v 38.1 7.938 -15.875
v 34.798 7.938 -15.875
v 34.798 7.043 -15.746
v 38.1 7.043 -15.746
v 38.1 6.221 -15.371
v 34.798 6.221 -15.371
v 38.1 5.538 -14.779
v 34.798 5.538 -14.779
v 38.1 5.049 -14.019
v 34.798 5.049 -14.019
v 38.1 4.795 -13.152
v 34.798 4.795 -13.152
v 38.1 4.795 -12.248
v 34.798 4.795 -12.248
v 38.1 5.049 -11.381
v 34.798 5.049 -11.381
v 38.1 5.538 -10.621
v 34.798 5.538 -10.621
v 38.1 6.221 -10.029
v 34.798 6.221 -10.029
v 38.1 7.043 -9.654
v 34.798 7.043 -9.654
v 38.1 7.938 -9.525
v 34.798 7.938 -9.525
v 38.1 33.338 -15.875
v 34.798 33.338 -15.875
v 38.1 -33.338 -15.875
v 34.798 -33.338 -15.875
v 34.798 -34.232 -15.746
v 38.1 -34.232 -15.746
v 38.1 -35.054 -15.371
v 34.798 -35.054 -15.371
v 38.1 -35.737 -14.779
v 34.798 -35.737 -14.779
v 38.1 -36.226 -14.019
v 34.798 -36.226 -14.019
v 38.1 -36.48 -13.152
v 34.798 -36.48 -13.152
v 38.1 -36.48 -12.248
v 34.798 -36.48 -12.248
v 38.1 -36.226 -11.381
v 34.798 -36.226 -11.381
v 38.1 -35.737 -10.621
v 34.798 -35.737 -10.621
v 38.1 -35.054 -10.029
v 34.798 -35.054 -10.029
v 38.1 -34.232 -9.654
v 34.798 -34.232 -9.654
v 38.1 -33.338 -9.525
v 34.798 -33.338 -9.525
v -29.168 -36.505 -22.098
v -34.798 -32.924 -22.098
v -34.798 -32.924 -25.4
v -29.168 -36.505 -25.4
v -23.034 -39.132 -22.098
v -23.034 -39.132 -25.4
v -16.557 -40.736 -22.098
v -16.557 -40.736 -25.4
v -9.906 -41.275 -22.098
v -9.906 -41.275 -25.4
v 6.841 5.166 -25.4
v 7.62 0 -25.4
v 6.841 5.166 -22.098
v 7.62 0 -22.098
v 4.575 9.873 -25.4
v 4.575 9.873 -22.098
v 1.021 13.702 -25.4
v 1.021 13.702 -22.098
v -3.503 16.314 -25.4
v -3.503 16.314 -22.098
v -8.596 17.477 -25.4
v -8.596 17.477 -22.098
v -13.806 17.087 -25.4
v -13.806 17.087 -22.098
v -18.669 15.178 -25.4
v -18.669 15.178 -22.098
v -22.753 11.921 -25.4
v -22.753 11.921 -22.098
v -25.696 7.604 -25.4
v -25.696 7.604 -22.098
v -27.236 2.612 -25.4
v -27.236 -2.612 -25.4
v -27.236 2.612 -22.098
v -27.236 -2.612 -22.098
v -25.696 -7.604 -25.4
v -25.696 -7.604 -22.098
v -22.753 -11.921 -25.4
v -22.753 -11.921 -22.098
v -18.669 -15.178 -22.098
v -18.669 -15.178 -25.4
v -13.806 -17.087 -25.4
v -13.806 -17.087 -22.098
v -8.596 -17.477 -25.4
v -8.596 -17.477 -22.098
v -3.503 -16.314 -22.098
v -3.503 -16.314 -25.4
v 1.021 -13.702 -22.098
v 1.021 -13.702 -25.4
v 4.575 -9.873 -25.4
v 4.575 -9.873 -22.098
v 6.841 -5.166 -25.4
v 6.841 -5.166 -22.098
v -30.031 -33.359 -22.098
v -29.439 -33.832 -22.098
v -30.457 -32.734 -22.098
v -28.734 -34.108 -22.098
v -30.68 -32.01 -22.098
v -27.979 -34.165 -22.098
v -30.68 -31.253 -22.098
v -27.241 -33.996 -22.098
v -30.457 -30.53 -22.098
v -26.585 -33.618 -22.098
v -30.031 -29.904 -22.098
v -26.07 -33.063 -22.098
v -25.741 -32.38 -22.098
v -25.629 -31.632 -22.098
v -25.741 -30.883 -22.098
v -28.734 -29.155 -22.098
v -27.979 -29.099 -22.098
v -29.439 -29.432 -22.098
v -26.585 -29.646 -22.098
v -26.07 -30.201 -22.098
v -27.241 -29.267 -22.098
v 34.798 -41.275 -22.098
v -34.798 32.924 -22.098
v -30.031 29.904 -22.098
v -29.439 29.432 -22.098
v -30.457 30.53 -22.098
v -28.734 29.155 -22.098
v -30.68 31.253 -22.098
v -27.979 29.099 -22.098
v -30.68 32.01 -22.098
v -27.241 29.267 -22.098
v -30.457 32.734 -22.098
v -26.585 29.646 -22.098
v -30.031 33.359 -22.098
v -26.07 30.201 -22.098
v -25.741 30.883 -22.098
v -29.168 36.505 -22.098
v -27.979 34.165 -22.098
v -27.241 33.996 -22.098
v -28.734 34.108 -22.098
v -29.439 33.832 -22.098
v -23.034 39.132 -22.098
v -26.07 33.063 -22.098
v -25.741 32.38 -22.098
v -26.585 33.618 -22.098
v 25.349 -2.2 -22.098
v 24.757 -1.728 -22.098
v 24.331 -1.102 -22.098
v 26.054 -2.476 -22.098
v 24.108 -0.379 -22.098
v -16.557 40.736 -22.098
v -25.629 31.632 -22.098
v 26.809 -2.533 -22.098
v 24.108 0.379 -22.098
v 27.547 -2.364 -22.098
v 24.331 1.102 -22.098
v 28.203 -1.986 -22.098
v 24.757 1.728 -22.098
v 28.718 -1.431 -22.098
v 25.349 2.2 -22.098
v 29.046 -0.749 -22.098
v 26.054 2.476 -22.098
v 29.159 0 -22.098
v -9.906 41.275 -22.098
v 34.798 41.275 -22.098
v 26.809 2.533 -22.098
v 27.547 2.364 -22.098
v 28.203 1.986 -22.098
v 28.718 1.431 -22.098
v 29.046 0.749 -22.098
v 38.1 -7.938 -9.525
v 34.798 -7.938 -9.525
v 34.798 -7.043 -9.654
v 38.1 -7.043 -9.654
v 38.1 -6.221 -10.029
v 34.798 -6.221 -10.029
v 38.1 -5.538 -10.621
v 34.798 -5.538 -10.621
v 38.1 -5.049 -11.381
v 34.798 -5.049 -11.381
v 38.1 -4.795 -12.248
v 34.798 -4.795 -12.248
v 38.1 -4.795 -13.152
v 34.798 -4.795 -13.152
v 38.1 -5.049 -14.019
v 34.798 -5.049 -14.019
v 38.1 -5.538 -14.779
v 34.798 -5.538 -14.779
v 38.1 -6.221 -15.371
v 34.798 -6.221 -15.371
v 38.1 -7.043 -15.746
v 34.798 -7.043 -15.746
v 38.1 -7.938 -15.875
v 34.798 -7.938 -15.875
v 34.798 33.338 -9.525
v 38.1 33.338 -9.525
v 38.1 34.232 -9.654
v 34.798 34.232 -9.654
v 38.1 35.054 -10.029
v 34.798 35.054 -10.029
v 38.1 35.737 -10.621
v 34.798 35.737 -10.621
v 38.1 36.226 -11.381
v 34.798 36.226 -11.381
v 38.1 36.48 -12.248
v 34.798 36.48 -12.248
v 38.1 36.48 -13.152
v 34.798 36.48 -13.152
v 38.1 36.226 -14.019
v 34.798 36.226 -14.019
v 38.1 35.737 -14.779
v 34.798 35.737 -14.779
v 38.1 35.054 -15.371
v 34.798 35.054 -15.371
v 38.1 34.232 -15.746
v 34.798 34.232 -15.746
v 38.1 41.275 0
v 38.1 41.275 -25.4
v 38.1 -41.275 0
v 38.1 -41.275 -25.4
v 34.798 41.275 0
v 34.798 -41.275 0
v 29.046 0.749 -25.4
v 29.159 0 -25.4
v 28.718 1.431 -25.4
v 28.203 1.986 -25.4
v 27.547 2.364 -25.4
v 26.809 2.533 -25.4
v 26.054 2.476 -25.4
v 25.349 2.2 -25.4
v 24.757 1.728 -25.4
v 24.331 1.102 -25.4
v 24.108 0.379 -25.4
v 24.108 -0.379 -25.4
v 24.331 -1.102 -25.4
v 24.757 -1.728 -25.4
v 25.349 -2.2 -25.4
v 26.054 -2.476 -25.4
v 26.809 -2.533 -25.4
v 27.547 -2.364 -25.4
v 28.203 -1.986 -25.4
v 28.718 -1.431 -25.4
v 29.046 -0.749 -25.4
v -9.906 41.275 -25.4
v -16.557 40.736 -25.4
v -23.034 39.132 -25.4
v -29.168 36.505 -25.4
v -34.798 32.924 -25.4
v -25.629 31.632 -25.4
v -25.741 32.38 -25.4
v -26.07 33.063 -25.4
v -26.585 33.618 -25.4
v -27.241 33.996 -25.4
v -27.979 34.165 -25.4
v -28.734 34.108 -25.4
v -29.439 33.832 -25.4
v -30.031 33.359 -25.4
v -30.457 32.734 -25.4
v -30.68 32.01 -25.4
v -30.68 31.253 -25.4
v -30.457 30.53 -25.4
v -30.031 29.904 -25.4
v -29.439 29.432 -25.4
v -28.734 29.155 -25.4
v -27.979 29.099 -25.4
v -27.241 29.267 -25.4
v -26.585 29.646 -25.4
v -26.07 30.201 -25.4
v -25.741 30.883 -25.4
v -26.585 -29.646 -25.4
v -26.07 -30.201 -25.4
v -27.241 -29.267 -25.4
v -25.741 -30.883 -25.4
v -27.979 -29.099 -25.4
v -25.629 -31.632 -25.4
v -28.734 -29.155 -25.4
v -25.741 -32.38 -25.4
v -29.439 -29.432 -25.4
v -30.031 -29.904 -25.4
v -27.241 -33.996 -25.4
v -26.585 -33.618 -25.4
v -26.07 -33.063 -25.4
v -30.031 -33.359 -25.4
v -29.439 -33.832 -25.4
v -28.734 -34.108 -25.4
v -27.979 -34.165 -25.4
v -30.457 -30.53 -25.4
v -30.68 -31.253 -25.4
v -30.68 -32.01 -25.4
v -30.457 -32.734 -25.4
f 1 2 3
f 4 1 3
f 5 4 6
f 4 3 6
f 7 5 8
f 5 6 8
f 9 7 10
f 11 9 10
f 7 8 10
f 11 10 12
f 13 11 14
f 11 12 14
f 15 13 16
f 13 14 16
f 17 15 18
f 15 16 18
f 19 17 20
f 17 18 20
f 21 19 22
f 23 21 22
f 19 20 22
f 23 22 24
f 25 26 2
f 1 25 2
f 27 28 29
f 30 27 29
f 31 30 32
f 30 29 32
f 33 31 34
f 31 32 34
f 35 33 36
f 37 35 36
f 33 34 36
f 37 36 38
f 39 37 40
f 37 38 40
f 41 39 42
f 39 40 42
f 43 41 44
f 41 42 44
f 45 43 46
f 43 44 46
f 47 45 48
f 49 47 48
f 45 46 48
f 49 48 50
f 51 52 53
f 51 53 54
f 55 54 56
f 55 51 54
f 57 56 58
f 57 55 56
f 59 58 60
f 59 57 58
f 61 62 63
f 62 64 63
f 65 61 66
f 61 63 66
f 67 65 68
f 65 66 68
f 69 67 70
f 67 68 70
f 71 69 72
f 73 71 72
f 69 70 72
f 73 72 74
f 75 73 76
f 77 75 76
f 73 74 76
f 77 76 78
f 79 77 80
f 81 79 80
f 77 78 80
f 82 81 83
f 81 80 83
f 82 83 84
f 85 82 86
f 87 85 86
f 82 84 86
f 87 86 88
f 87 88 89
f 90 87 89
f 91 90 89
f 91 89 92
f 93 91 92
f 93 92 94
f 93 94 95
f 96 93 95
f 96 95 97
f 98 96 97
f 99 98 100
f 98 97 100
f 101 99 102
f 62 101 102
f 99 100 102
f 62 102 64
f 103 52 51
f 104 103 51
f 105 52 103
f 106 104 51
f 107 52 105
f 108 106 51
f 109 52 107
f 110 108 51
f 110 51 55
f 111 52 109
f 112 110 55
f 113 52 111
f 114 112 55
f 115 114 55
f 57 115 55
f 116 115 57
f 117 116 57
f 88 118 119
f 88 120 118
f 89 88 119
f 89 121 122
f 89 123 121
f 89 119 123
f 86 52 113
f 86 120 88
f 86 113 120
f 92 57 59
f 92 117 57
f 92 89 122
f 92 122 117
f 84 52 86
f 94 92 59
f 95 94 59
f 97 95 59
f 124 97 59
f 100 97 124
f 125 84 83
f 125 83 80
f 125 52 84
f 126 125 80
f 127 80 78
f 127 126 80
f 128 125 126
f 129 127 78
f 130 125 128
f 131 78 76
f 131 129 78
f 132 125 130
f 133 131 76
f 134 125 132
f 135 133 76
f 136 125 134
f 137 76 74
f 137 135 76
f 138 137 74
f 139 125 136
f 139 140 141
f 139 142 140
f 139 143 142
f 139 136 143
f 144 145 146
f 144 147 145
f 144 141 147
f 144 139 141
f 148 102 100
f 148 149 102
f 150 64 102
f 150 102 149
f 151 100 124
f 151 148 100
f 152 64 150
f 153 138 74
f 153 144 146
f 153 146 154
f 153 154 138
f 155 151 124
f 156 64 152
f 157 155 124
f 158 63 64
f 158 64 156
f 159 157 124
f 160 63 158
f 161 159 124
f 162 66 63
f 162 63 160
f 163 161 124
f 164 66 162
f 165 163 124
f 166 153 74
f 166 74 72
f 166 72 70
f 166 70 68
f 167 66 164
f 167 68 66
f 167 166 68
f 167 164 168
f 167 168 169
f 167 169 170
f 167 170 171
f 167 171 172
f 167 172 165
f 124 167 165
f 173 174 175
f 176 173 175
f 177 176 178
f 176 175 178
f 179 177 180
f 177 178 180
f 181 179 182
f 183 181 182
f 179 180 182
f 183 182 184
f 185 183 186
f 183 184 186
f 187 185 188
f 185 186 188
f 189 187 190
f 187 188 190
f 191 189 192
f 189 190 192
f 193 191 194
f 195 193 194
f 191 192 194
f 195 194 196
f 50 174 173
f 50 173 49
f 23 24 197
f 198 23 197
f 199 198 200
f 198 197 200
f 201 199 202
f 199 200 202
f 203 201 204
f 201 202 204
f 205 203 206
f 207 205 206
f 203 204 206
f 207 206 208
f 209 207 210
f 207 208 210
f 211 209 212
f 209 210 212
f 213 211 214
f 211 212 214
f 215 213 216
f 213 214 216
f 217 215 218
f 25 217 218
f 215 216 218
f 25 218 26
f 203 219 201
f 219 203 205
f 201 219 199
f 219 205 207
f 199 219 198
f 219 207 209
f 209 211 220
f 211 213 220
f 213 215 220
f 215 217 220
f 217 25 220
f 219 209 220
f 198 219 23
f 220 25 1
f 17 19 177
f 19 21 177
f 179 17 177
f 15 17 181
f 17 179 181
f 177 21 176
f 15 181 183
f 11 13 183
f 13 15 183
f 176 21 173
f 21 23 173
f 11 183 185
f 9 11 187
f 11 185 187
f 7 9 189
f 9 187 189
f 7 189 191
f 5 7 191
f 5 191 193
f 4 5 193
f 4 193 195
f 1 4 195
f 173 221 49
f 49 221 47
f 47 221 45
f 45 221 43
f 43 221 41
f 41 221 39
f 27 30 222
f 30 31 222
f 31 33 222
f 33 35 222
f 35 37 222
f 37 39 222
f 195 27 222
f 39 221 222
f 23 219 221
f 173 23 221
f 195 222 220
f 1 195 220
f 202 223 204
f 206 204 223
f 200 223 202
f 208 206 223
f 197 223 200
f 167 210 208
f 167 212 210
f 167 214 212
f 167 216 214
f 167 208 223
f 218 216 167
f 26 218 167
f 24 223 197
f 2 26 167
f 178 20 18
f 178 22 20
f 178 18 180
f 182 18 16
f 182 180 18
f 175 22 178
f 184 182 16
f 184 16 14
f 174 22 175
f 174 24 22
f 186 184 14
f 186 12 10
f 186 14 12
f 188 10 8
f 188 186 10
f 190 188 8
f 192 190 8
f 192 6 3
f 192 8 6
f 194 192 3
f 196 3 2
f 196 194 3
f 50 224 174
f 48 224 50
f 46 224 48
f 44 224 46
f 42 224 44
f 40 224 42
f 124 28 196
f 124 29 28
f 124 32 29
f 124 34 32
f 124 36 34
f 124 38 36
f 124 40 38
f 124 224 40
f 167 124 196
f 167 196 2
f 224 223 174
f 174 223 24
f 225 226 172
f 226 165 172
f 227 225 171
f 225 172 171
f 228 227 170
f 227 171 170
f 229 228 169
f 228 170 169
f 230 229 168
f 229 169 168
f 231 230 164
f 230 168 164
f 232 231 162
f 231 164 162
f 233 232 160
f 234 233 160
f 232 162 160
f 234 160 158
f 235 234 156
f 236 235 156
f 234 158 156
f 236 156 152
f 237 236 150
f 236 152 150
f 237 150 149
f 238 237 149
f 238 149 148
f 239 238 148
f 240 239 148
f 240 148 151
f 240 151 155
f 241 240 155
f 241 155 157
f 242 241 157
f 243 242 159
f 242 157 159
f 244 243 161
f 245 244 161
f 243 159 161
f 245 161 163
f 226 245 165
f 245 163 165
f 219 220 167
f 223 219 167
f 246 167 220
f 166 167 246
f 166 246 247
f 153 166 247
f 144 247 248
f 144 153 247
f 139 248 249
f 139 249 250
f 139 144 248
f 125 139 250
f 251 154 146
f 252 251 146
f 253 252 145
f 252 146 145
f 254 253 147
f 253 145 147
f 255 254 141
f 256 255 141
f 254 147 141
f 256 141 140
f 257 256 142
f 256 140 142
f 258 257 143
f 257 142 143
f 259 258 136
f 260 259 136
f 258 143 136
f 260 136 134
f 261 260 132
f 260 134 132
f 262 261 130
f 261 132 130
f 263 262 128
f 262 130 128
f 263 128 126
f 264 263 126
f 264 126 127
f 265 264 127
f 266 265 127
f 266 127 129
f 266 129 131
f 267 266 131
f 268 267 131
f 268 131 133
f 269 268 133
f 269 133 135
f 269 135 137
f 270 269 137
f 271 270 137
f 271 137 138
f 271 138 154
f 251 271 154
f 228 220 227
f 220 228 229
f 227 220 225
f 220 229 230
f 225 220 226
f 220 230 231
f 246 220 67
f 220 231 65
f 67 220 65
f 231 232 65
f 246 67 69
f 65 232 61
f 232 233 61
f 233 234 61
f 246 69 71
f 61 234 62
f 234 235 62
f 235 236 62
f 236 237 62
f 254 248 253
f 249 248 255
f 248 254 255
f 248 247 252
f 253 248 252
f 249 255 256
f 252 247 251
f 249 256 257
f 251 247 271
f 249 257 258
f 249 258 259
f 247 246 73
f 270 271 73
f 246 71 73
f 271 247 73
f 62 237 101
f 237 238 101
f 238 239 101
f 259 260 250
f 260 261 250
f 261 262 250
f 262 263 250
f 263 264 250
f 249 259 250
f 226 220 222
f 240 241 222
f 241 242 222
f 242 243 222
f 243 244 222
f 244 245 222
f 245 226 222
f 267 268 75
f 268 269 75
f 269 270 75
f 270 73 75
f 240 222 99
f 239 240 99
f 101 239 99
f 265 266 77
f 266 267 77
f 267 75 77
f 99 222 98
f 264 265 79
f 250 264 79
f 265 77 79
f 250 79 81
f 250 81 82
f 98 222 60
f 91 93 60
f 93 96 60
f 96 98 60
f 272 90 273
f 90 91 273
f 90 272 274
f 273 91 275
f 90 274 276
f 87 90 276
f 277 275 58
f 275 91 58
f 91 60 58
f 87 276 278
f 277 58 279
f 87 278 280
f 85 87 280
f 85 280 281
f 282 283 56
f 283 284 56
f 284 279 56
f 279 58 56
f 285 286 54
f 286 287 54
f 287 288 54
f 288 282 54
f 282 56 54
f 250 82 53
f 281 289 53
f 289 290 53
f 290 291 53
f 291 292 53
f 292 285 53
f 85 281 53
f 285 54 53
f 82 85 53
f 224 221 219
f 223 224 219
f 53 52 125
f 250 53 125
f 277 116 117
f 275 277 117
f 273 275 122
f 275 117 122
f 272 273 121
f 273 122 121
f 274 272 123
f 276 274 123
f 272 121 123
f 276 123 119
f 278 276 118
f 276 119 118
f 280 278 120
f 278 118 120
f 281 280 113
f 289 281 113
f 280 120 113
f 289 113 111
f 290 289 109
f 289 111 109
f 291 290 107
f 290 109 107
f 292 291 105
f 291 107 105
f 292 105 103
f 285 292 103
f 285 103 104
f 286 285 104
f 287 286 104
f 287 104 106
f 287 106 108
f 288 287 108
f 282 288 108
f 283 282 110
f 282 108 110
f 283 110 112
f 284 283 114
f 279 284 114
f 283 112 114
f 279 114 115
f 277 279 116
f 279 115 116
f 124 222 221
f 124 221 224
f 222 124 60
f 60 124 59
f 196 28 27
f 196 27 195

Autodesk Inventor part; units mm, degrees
ref_plane "YZ Plane" through (0, 0, 0) normal (1, 0, 0) x (0, 1, 0)
ref_plane "XZ Plane" through (0, 0, 0) normal (0, 1, 0) x (-1, 0, 0)
ref_plane "XY Plane" through (0, 0, 0) normal (0, 0, 1) x (1, 0, 0)
sketch "Sketch2" plane through (0, 0, 0) normal (0, 1, 0) x (-1, 0, 0)
  line L0 (38.1, 25.4) -> (-38.1, 25.4)
  line L1 (-38.1, 25.4) -> (-38.1, -25.4)
  line L2 (-38.1, -25.4) -> (38.1, -25.4)
  line L3 (38.1, -25.4) -> (38.1, 25.4)
  line L4 (34.798, 22.098) -> (-34.798, 22.098)
  line L5 (-34.798, 22.098) -> (-34.798, -22.098)
  line L6 (-34.798, -22.098) -> (34.798, -22.098)
  line L7 (34.798, -22.098) -> (34.798, 22.098)
  line L8 (0, -35.56) -> (0, 35.56) projected
  line L9 (-53.34, 0) -> (53.34, 0) projected
  point P0 (0, 0)
  dimension "d0" = 3.302
  dimension "d1" = 76.2
  dimension "d2" = 50.8
extrude "Extrusion1" add sketch "Sketch2" along normal mid plane 82.55 contours L3 L9 L7 L4 L8 L0 | L8 L4 L5 L9 L1 L0 | L3 L2 L8 L6 L7 L9 | L9 L5 L6 L8 L2 L1
sketch "Sketch4" plane through (-34.798, -41.275, -22.098) normal (0, 0, 1) x (1, 0, 0)
  line L0 (0, 0) -> (0, 82.55) projected
  line L1 (69.596, 0) -> (0, 0) projected
  line L2 (69.596, 0) -> (69.596, 82.55) projected
  line L3 (0, 82.55) -> (69.596, 82.55) projected
  arc A0 (0, 8.3506) -> (0, 74.1994) centre (24.892, 41.275) ccw
  line L4 (-18.542, 41.275) -> (88.138, 41.275) projected
  line L5 (0, 8.3506) -> (0, 74.1994)
  line L6 (72.898, 82.55) -> (-3.302, 82.55) construction
  circle A1 centre (24.892, 41.275) radius 17.526
  line L7 (-3.302, 0) -> (72.898, 0) projected
  line L8 (24.892, 0) -> (-3.302, 0)
  line L9 (-3.302, 0) -> (-3.302, 82.55)
  line L10 (-3.302, 0) -> (-3.302, 82.55) projected
  line L11 (-3.302, 82.55) -> (24.892, 82.55)
  circle A2 centre (61.4172, 41.275) radius 2.54
  circle A3 centre (6.6294, 72.9068) radius 2.54
  circle A4 centre (6.6294, 9.6432) radius 2.54
  point P0 (34.798, 41.275)
  dimension "d9" = 44.704
  dimension "d13" = 35.052
  dimension "d26" = 36.5252
  dimension "d27" = 5.08
  dimension "d30" = 360
extrude "Extrusion3" cut sketch "Sketch4" along normal up to surface (47.498 mm away) contours L7 L9 L4 L0 | L0 A0 L1 | L4 L9 L11 L0 | L0 L3 A0 | A1 L4 | L4 A1 | A2 L4 | L4 A2 | A3 | A4
extrude "Extrusion4" cut sketch "Sketch4" against normal up to surface (3.302 mm away) contours L7 L9 L4 L0 | L0 A0 L1 | L4 L9 L11 L0 | L0 L3 A0 | A1 L4 | L4 A1 | A2 L4 | L4 A2 | A3 | A4
sketch "Sketch5" plane through (38.1, -41.275, -25.4) normal (1, 0, 0) x (0, 0, -1)
  line L0 (0, 0) -> (0, 82.55) projected
  line L1 (-50.8, 82.55) -> (0, 82.55) projected
  line L2 (-50.8, 0) -> (-50.8, 82.55) projected
  line L3 (0, 0) -> (-50.8, 0) projected
  line L4 (-25.4, 0) -> (-25.4, 82.55)
  line L5 (-50.8, 82.55) -> (0, 82.55) projected
  point P0 (-25.4, 41.275)
  dimension "d18" = 25.4
extrude "Extrusion5" cut sketch "Sketch5" against normal up to surface (72.898 mm away) contours L3 L2 L1 L4
sketch "Sketch6" plane through (34.798, -41.275, -22.098) normal (-1, 0, 0) x (0, 0, 1)
  line L0 (22.098, 0) -> (22.098, 82.55) projected
  line L1 (0, 0) -> (0, 82.55) projected
  line L2 (44.196, 0) -> (0, 0) projected
  arc A0 (12.573, 74.6125) -> (6.223, 74.6125) centre (9.398, 74.6125) ccw
  arc A1 (6.223, 7.9375) -> (12.573, 7.9375) centre (9.398, 7.9375) ccw
  arc A2 (6.223, 49.2125) -> (12.573, 49.2125) centre (9.398, 49.2125) ccw
  arc A3 (12.573, 33.3375) -> (6.223, 33.3375) centre (9.398, 33.3375) ccw
  line L3 (12.573, 33.3375) -> (12.573, 7.9375)
  line L4 (6.223, 7.9375) -> (6.223, 33.3375)
  line L5 (12.573, 49.2125) -> (12.573, 74.6125)
  line L6 (6.223, 74.6125) -> (6.223, 49.2125)
  line L7 (22.098, 41.275) -> (0, 41.275) construction
  line L8 (6.223, 61.9125) -> (12.573, 61.9125) construction
  line L9 (0, 82.55) -> (22.098, 82.55) construction
  line L10 (0, 82.55) -> (44.196, 82.55) construction
  line L11 (9.398, 74.6125) -> (9.398, 49.2125) construction
  point P0 (22.098, 41.275)
  dimension "d21" = 6.35
  dimension "d22" = 25.4
  dimension "d23" = 12.7
extrude "Extrusion6" cut sketch "Sketch6" against normal up to next
equation "\"d0\" = WallThickness"
equation "\"d3\" = DiameterMotor"
equation "\"d13\" = InnerHole"
equation "\"d26\" = Distance2Screw"
equation "\"WallThickness\" = 3.302"
equation "\"DiameterMotor\" = 82.55"
equation "\"InnerHole\" = 35.052"
equation "\"Distance2Screw\" = 36.5252"
equation "\"ScrewDiameter\" = 5.08"
properties part number "CIM Bracket"
